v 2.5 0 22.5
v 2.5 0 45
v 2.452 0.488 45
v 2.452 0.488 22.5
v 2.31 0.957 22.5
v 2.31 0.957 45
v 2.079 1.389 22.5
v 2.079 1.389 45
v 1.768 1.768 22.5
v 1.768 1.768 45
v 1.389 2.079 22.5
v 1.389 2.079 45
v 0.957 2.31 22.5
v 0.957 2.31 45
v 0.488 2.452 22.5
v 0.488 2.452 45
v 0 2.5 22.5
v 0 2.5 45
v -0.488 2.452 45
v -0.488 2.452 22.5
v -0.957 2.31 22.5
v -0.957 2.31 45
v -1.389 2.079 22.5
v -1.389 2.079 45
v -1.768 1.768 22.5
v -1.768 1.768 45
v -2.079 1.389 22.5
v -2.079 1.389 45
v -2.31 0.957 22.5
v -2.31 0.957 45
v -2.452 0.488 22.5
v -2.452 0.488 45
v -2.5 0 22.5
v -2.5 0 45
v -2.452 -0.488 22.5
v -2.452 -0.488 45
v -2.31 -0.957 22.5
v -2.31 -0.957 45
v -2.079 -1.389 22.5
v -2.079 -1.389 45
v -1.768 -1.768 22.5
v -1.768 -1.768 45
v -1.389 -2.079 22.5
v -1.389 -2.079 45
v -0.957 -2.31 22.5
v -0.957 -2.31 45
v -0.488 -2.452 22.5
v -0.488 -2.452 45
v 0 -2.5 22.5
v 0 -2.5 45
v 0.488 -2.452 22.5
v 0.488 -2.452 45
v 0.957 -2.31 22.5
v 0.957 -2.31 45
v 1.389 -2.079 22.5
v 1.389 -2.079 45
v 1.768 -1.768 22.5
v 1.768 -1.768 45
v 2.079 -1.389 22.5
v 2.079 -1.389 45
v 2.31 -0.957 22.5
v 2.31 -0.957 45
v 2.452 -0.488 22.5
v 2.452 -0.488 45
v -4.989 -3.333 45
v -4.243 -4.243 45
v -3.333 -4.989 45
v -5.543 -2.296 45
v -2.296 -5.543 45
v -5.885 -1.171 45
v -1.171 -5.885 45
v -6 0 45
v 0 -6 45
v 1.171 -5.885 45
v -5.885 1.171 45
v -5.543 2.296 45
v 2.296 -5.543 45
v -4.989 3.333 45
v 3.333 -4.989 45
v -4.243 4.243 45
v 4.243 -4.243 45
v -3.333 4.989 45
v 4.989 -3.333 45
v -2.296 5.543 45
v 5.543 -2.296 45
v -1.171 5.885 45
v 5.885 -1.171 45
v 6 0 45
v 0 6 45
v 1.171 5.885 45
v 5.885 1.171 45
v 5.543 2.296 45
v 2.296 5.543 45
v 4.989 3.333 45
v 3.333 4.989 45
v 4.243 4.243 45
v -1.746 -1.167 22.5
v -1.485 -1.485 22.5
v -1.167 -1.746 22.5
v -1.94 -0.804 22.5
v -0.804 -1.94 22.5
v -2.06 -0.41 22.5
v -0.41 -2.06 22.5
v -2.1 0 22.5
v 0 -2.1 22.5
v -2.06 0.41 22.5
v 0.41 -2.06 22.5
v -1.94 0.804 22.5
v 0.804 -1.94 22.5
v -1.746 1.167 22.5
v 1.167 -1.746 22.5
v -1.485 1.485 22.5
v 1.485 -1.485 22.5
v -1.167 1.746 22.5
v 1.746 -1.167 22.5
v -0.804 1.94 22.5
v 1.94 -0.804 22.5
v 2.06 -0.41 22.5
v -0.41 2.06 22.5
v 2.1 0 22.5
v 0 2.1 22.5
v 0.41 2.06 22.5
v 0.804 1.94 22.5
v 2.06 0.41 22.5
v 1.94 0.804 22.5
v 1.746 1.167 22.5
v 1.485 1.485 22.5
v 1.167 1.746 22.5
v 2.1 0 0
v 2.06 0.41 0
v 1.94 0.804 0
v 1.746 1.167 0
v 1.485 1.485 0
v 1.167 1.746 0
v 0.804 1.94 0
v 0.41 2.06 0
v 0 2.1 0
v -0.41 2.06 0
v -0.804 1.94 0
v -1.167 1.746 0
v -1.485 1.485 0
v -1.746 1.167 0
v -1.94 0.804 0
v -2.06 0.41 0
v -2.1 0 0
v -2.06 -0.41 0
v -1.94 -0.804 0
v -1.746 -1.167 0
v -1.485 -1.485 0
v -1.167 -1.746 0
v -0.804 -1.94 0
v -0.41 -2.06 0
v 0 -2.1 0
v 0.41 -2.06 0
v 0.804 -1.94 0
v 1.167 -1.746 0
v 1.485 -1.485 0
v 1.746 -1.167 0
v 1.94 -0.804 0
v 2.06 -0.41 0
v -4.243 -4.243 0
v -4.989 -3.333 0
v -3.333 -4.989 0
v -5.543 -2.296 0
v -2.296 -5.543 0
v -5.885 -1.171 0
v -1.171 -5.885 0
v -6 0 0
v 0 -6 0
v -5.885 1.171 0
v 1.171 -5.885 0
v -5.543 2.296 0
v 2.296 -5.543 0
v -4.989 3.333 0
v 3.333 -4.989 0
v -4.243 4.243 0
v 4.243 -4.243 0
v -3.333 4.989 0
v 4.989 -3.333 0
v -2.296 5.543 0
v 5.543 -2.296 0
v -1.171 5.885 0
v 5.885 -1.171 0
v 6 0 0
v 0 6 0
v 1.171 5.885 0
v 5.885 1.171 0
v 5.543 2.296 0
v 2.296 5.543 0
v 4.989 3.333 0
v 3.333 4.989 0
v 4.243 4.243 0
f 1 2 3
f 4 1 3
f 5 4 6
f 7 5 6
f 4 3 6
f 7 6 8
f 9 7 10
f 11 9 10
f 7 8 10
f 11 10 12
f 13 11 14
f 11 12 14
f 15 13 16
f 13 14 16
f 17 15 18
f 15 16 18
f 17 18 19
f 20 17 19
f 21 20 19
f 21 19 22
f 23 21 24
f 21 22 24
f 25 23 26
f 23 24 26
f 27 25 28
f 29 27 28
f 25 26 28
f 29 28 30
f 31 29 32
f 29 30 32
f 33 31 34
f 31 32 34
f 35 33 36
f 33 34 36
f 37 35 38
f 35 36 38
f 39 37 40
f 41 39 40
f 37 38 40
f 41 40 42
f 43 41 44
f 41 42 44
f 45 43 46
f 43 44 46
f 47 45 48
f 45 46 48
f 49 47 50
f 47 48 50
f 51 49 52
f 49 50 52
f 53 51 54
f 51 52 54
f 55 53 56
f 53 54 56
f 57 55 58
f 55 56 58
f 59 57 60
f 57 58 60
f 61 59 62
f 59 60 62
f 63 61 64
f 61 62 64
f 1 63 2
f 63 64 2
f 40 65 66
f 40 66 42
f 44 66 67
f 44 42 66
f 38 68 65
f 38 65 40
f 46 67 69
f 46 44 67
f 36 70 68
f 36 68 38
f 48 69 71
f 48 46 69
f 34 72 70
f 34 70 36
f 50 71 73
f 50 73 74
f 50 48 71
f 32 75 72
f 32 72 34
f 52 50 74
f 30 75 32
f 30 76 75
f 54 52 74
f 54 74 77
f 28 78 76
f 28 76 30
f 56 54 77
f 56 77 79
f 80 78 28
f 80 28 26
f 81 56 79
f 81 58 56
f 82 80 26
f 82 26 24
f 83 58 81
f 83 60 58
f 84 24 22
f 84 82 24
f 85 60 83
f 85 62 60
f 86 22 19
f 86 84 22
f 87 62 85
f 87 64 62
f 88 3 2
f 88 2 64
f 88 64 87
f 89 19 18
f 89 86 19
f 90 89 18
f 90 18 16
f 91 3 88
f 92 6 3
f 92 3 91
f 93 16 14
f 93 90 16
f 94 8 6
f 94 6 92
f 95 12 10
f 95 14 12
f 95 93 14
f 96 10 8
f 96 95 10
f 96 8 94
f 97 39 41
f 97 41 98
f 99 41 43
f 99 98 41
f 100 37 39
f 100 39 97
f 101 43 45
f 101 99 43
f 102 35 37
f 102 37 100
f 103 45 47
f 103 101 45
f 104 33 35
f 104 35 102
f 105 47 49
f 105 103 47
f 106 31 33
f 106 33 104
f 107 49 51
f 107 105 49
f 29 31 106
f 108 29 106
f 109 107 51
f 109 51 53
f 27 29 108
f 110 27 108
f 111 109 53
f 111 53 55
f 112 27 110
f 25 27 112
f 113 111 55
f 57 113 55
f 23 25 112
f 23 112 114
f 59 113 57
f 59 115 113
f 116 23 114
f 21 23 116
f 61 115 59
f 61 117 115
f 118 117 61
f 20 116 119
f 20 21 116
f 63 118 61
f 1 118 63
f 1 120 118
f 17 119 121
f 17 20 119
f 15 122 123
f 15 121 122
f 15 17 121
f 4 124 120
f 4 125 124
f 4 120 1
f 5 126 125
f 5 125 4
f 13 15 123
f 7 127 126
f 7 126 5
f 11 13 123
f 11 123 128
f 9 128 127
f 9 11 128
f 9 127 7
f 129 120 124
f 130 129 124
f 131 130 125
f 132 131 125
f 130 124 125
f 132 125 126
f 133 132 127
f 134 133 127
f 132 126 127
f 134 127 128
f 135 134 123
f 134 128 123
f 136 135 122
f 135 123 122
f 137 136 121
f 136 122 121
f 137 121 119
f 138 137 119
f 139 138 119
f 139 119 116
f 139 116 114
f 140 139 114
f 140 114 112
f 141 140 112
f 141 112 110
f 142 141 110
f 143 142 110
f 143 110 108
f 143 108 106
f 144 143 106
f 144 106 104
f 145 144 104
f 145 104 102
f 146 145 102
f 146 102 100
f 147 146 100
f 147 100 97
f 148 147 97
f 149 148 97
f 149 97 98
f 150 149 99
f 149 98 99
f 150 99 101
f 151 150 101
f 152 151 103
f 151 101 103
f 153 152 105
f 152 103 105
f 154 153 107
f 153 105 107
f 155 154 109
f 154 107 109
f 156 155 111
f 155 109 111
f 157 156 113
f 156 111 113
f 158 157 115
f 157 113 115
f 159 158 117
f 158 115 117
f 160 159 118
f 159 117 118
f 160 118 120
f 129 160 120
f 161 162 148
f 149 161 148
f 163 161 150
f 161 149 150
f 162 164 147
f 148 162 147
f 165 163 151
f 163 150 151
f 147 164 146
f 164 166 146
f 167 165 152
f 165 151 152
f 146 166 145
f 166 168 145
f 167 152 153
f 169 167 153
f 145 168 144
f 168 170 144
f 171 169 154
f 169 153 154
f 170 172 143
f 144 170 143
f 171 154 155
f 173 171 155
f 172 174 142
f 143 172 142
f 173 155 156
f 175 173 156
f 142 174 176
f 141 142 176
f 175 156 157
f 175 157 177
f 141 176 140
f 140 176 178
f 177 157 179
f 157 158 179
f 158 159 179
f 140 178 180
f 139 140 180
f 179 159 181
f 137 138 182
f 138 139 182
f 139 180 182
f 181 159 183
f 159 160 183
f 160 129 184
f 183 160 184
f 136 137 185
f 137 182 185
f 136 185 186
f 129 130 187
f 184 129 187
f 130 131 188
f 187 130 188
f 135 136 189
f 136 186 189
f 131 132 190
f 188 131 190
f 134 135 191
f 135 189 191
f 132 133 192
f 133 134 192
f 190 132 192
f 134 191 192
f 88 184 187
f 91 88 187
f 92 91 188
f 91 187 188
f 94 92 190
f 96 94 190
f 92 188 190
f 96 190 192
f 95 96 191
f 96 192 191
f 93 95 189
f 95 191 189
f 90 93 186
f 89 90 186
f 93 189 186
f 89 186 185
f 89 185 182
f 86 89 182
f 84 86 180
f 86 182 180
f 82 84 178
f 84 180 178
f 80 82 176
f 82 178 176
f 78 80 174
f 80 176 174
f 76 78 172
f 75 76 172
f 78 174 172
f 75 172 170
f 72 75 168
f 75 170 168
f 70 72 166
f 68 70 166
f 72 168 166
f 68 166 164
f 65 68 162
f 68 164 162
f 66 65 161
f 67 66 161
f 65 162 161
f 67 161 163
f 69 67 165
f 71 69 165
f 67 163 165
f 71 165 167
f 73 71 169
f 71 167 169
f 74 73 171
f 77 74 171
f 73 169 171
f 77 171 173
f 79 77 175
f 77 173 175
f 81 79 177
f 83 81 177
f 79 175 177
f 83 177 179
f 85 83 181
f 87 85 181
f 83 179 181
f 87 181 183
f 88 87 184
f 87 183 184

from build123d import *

# Parameters (mm, degrees)
SKETCH1_R           = 6
BOSS_EXTRUDE1_DEPTH = 45
SKETCH2_R           = 2.1
CUT_EXTRUDE1_DEPTH  = 46
SKETCH5_R           = 2.5
CUT_EXTRUDE2_DEPTH  = 22.5


with BuildPart() as part:
    # Sketch1 → Boss-Extrude1 (new body)
    with BuildSketch(Plane.XY):
        Circle(SKETCH1_R)
    extrude(amount=BOSS_EXTRUDE1_DEPTH)

    # Sketch2 → Cut-Extrude1 (cut, through all)
    with BuildSketch(Plane.XY.offset(45)):
        Circle(SKETCH2_R)
    extrude(amount=-CUT_EXTRUDE1_DEPTH, mode=Mode.SUBTRACT)

    # Sketch5 → Cut-Extrude2 (cut, symmetric)
    with BuildSketch(Plane.XY.offset(45)):
        Circle(SKETCH5_R)
    extrude(amount=CUT_EXTRUDE2_DEPTH, both=True, mode=Mode.SUBTRACT)


solid = part.part
